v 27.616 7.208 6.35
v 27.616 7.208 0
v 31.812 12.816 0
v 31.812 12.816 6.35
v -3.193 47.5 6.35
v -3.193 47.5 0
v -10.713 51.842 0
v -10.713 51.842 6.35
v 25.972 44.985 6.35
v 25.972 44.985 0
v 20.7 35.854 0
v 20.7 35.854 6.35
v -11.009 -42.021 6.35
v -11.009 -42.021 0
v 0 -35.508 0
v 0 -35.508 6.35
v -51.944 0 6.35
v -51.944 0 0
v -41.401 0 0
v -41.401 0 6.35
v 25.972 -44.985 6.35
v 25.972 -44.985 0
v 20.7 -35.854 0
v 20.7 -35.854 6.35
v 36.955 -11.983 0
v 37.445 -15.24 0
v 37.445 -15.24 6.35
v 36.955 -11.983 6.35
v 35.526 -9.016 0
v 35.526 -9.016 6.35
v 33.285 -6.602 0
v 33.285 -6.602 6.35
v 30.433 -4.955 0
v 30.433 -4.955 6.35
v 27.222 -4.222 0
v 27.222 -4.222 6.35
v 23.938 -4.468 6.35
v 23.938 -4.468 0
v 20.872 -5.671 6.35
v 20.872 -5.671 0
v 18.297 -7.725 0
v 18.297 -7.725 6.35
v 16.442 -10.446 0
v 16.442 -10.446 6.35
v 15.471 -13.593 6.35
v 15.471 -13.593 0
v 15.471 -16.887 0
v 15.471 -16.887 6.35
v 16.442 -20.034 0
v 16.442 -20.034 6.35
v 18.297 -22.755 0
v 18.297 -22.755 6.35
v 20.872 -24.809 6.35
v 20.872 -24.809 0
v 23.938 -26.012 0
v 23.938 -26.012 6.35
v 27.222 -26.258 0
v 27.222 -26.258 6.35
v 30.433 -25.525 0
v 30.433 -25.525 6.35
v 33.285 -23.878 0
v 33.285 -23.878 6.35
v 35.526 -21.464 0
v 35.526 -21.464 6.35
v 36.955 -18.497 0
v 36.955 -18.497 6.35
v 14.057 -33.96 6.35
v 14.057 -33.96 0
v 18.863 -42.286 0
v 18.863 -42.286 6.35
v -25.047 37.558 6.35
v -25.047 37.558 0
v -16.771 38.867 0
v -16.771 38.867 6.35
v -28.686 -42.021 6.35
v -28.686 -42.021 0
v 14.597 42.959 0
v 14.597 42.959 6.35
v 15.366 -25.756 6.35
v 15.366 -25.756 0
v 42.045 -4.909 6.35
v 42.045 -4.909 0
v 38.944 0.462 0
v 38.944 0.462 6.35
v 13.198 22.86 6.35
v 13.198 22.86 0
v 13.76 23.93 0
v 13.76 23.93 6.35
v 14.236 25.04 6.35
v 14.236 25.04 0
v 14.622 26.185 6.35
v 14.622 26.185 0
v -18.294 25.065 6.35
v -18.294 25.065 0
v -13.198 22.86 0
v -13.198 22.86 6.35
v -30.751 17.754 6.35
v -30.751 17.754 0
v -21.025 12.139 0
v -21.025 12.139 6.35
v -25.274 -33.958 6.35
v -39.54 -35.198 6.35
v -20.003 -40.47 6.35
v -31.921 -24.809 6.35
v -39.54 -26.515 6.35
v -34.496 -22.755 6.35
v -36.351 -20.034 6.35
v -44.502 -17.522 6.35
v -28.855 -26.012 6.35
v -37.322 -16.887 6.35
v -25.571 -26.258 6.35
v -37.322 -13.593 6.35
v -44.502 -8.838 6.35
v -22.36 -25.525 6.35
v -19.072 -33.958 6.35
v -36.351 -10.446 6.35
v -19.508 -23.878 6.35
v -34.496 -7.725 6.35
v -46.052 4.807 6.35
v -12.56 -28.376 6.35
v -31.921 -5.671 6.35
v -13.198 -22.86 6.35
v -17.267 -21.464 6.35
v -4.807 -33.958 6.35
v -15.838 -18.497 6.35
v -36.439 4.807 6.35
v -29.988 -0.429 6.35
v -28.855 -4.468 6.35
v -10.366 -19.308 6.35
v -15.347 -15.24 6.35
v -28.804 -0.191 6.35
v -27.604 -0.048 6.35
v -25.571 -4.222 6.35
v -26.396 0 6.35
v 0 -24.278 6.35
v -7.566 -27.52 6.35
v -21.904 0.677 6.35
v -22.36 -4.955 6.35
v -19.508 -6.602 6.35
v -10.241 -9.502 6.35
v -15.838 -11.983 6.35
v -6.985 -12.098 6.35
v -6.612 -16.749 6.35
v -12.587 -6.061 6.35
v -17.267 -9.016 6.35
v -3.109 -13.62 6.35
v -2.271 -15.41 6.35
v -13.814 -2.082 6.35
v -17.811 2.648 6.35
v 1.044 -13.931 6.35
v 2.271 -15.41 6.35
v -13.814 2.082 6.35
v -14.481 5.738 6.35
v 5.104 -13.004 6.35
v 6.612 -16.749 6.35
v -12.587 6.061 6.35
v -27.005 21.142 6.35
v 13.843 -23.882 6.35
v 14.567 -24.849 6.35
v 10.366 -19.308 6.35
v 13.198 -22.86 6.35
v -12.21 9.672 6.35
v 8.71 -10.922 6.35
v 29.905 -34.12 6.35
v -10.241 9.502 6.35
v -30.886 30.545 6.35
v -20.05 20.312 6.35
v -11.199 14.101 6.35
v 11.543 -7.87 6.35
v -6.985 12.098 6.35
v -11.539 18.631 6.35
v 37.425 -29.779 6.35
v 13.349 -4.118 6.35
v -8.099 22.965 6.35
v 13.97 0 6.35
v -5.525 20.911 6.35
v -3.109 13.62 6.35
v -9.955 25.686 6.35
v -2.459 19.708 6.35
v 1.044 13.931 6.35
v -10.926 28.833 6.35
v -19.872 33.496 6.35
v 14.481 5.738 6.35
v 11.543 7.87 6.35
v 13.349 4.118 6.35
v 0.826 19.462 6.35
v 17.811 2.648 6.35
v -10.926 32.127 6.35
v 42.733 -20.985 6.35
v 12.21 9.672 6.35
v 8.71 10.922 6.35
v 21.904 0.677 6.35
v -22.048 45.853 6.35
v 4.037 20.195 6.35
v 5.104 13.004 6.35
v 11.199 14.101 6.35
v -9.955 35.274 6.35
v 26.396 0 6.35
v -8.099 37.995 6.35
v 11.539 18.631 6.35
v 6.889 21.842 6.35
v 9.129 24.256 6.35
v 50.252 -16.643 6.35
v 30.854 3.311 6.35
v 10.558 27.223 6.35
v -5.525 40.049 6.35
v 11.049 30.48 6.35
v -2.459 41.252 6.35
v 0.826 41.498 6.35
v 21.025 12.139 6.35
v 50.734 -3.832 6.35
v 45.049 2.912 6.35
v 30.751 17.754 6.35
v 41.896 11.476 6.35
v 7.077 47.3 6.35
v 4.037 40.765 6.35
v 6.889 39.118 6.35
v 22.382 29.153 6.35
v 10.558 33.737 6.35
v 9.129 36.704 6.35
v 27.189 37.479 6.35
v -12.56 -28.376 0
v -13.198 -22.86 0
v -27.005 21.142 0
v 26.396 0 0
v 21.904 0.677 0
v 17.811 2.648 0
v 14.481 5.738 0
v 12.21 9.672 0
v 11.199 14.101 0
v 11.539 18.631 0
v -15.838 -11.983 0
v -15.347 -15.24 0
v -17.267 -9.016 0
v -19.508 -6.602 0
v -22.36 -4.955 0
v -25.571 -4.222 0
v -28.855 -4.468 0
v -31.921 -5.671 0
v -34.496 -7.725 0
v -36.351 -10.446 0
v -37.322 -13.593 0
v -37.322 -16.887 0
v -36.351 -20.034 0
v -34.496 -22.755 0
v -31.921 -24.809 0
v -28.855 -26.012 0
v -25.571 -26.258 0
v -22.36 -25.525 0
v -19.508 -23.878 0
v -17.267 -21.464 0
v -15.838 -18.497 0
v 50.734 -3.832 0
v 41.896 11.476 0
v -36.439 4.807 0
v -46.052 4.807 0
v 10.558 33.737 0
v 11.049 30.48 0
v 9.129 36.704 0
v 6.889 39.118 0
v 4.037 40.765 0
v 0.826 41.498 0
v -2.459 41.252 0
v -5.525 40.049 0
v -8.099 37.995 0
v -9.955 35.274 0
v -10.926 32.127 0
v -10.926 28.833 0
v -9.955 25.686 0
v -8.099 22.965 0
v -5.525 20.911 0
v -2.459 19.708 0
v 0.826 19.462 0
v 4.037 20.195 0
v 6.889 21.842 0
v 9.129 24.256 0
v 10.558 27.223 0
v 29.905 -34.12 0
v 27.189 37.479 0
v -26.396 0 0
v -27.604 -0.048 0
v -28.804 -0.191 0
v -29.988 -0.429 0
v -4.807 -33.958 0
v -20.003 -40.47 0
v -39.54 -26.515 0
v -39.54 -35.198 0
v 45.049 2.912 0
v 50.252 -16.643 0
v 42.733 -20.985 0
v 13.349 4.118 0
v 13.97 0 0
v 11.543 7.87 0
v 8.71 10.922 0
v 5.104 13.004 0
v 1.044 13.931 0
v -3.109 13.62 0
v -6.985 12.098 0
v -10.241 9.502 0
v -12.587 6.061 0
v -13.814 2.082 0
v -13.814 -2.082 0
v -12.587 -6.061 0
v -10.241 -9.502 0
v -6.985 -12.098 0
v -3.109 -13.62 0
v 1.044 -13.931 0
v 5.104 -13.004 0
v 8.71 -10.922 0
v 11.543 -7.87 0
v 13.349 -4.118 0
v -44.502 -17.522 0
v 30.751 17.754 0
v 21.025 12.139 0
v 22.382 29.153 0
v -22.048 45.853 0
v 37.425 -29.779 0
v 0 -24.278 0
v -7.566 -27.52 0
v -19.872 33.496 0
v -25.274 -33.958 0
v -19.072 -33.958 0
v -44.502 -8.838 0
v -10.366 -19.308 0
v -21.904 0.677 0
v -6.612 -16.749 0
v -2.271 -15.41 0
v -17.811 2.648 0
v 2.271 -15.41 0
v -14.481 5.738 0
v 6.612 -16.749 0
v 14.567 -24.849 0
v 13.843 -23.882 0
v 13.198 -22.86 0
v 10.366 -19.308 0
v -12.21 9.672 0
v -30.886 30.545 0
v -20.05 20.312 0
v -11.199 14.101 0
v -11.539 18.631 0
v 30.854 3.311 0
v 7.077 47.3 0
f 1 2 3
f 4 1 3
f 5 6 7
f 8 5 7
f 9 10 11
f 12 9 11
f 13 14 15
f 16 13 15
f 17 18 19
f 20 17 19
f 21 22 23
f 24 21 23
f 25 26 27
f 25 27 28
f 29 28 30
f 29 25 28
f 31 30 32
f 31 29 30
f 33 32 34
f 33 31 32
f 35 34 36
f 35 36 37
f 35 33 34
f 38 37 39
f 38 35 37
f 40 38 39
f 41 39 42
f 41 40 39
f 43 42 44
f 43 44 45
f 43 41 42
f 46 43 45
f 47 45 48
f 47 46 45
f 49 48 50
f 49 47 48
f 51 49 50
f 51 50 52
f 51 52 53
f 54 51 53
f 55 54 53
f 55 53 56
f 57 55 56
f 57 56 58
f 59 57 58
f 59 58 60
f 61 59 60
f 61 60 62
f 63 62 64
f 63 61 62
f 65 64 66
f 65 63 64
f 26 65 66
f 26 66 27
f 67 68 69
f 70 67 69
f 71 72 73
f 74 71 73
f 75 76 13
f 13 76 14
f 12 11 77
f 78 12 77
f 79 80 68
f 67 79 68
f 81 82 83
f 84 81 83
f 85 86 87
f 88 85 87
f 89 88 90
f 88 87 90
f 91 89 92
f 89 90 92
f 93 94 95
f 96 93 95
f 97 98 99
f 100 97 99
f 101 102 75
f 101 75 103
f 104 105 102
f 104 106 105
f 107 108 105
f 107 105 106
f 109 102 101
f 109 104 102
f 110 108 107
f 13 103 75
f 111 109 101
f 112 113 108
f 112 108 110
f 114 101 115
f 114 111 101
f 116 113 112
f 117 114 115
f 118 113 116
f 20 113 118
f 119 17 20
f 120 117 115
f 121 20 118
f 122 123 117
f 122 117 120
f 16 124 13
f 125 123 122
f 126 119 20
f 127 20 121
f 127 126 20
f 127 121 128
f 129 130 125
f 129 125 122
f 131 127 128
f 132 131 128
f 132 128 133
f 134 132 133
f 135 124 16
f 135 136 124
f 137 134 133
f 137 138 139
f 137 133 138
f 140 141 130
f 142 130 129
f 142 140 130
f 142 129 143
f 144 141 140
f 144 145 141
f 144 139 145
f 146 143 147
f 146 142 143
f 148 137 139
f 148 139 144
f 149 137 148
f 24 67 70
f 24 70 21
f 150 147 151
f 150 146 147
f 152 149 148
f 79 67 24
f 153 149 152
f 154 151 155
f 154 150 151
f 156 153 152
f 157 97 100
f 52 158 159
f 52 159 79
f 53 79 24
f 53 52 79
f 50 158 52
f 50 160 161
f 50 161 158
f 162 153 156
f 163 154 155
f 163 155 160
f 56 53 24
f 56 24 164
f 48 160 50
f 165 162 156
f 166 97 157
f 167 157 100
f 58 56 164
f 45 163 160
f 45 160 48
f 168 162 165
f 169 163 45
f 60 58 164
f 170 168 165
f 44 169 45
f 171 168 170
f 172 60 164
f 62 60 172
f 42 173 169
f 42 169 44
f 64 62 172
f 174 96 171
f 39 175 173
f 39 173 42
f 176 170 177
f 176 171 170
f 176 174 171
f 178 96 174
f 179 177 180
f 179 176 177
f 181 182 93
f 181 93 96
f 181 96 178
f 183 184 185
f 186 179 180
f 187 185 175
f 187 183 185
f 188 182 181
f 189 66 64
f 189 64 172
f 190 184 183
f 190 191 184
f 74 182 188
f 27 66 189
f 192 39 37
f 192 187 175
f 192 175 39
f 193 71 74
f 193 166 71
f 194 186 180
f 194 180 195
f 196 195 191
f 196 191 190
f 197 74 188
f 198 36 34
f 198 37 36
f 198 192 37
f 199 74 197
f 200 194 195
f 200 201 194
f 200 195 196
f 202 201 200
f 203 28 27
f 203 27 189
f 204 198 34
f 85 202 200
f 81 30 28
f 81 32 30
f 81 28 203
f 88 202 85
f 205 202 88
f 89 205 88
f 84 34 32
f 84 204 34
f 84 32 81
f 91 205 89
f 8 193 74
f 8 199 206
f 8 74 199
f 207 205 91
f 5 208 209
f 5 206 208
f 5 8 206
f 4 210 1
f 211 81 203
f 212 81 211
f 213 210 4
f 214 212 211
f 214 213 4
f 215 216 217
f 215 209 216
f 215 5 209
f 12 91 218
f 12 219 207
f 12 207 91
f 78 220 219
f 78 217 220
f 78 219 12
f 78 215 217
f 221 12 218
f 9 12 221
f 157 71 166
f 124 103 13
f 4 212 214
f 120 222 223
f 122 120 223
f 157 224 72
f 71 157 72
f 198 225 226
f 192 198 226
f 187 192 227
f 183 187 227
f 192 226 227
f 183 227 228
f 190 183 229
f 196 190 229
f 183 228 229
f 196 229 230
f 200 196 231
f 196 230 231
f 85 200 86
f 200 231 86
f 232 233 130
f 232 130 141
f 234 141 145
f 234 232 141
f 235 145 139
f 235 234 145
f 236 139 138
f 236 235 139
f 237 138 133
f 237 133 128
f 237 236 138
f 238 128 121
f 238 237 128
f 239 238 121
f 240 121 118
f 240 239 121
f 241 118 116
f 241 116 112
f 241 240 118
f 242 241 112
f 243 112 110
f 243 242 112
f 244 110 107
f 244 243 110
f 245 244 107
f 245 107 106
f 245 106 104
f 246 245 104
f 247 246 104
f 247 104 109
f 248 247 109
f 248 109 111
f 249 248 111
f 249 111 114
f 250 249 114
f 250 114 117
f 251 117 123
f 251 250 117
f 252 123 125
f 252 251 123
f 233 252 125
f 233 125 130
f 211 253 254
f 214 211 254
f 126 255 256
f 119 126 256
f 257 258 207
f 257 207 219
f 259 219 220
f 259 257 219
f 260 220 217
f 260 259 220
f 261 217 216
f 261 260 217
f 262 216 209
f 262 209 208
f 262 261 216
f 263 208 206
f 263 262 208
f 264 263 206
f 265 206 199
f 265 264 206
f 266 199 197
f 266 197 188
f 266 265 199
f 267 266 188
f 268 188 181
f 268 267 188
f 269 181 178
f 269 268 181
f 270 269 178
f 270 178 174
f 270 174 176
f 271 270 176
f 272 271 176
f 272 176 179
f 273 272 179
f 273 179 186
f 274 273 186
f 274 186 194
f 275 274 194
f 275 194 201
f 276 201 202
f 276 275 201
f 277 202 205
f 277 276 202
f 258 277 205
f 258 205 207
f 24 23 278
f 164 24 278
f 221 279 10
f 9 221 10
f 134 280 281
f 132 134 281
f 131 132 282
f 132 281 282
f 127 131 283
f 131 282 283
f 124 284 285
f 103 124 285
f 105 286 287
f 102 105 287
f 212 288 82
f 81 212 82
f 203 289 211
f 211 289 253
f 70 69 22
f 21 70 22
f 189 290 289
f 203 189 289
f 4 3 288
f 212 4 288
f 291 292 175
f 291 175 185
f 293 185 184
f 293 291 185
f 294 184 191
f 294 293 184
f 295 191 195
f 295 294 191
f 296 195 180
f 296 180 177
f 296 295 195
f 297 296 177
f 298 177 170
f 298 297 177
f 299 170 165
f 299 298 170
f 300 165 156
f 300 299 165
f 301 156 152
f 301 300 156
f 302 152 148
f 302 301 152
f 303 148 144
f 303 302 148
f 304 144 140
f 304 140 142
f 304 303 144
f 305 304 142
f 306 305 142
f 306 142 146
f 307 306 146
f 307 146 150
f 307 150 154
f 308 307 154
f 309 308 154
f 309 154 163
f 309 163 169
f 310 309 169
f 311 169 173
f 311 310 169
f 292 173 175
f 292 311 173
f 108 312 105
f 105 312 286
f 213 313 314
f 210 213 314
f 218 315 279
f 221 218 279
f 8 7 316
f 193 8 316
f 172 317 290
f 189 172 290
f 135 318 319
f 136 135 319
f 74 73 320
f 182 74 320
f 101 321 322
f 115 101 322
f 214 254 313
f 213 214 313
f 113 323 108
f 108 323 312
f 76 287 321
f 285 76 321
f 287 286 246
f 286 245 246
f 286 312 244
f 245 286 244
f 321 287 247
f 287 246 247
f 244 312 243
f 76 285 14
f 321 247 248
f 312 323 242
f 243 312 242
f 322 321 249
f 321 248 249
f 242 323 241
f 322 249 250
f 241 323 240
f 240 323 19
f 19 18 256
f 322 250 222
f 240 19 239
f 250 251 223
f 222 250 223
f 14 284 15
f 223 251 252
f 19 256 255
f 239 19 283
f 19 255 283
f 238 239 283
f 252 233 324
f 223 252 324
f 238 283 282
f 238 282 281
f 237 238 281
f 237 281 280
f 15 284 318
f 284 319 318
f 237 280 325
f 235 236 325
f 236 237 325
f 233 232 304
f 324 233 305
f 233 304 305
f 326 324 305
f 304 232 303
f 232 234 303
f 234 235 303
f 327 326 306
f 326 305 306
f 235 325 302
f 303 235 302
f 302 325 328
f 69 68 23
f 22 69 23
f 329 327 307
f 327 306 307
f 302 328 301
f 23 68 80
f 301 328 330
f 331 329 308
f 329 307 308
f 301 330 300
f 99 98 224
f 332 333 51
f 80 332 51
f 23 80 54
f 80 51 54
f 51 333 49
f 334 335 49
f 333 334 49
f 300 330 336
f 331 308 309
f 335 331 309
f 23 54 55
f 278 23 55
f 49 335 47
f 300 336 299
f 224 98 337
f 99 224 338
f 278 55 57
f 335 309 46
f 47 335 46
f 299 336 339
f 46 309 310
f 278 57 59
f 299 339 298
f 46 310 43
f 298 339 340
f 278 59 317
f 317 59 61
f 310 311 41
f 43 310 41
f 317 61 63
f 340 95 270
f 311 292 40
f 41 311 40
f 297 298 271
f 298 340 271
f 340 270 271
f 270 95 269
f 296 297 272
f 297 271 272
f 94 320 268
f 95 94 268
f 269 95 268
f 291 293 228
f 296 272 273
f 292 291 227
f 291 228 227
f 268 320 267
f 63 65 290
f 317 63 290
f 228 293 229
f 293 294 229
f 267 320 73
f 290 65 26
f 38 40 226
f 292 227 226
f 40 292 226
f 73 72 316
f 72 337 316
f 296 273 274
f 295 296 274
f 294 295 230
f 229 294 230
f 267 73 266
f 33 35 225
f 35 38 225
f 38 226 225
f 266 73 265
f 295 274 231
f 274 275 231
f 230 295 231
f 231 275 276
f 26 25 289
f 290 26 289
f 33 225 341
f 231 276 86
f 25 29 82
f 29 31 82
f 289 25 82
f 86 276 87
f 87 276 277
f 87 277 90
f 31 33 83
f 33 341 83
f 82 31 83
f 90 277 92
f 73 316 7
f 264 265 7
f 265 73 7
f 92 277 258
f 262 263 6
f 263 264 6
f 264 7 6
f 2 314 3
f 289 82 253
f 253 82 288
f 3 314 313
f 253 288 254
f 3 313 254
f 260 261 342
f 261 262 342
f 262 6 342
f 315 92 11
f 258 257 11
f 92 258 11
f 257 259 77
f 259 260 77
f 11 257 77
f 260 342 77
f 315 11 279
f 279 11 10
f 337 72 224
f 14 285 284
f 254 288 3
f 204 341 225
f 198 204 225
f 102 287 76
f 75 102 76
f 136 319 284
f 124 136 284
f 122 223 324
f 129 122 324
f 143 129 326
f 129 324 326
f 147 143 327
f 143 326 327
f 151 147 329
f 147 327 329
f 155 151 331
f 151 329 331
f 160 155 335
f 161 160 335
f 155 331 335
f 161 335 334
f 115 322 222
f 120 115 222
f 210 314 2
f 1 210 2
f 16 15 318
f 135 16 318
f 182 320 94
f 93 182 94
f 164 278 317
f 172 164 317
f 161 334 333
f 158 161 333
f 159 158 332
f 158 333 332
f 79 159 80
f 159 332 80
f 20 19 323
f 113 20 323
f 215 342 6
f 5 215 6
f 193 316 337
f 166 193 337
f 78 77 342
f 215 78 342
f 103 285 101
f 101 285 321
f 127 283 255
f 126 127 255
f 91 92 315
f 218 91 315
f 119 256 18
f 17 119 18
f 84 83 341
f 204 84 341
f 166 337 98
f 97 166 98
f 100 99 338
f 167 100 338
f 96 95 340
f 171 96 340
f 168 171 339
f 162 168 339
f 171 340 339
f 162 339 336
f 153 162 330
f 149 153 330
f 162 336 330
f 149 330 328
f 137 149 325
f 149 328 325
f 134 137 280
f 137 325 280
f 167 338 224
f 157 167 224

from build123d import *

# Parameters (mm, degrees)
F0_R     = 11.049
F0_R_2   = 13.97
F1_DEPTH = 6.35


with BuildPart() as f1:
    # F0 (on Top) → F1 (new body)
    with BuildSketch(Plane.XY):
        with BuildLine():
            ThreePointArc((26.396454, 0), (13.198227, 7.62), (13.198227, 22.86))
            ThreePointArc((13.198227, 22.86), (14.009272, 24.480176), (14.622308, 26.185155))
            Line((14.622308, 26.185155), (22.382144, 29.153406))
            Line((22.382144, 29.153406), (27.188946, 37.479031))
            Line((27.188946, 37.479031), (25.972238, 44.985235))
            Line((25.972238, 44.985235), (20.700261, 35.853904))
            Line((20.700261, 35.853904), (14.596639, 42.95875))
            Line((14.596639, 42.95875), (7.07672, 47.300377))
            Line((7.07672, 47.300377), (-3.192702, 47.499965))
            Line((-3.192702, 47.499965), (-10.71262, 51.841591))
            Line((-10.71262, 51.841591), (-22.048165, 45.852972))
            Line((-22.048165, 45.852972), (-30.886479, 30.544563))
            Line((-30.886479, 30.544563), (-30.751104, 17.754158))
            Line((-30.751104, 17.754158), (-21.025084, 12.138838))
            Line((-21.025084, 12.138838), (-20.050264, 20.312221))
            Line((-20.050264, 20.312221), (-27.004857, 21.141678))
            Line((-27.004857, 21.141678), (-25.046949, 37.557762))
            Line((-25.046949, 37.557762), (-16.771019, 38.867205))
            Line((-16.771019, 38.867205), (-19.872182, 33.495833))
            Line((-19.872182, 33.495833), (-18.294169, 25.064847))
            Line((-18.294169, 25.064847), (-13.198227, 22.86))
            ThreePointArc((-13.198227, 22.86), (-13.198227, 7.62), (-26.396454, 0))
            ThreePointArc((-26.396454, 0), (-28.205091, -0.107702), (-29.988163, -0.429287))
            Line((-29.988163, -0.429287), (-36.438663, 4.806802))
            Line((-36.438663, 4.806802), (-46.052266, 4.806802))
            Line((-46.052266, 4.806802), (-51.944476, 0))
            Line((-51.944476, 0), (-41.400522, 0))
            Line((-41.400522, 0), (-44.501688, -8.838315))
            Line((-44.501688, -8.838315), (-44.501688, -17.52157))
            Line((-44.501688, -17.52157), (-39.539825, -26.514944))
            Line((-39.539825, -26.514944), (-39.539825, -35.198197))
            Line((-39.539825, -35.198197), (-28.685756, -42.020757))
            Line((-28.685756, -42.020757), (-11.009128, -42.020757))
            Line((-11.009128, -42.020757), (0, -35.508316))
            Line((0, -35.508316), (0, -24.277676))
            Line((0, -24.277676), (-7.565767, -27.520148))
            Line((-7.565767, -27.520148), (-4.806802, -33.957731))
            Line((-4.806802, -33.957731), (-20.002501, -40.470175))
            Line((-20.002501, -40.470175), (-25.274477, -33.957731))
            Line((-25.274477, -33.957731), (-19.072151, -33.957731))
            Line((-19.072151, -33.957731), (-12.559709, -28.375639))
            Line((-12.559709, -28.375639), (-13.198227, -22.86))
            ThreePointArc((-13.198227, -22.86), (0, -15.24), (13.198227, -22.86))
            ThreePointArc((13.198227, -22.86), (14.195818, -24.372474), (15.365855, -25.755868))
            Line((15.365855, -25.755868), (14.056519, -33.960209))
            Line((14.056519, -33.960209), (18.86332, -42.285833))
            Line((18.86332, -42.285833), (25.972238, -44.985235))
            Line((25.972238, -44.985235), (20.700261, -35.853904))
            Line((20.700261, -35.853904), (29.905049, -34.120435))
            Line((29.905049, -34.120435), (37.424968, -29.778808))
            Line((37.424968, -29.778808), (42.732527, -20.985021))
            Line((42.732527, -20.985021), (50.252445, -16.643395))
            Line((50.252445, -16.643395), (50.733921, -3.832215))
            Line((50.733921, -3.832215), (41.895607, 11.476194))
            Line((41.895607, 11.476194), (30.751104, 17.754158))
            Line((30.751104, 17.754158), (21.025084, 12.138838))
            Line((21.025084, 12.138838), (27.616031, 7.207928))
            Line((27.616031, 7.207928), (31.811659, 12.816053))
            Line((31.811659, 12.816053), (45.049451, 2.912414))
            Line((45.049451, 2.912414), (42.045496, -4.909474))
            Line((42.045496, -4.909474), (38.944333, 0.461898))
            Line((38.944333, 0.461898), (30.853878, 3.310792))
            Line((30.853878, 3.310792), (26.396454, 0))
        make_face()
        with Locations((-26.396454, -15.24)):
            Circle(F0_R, mode=Mode.SUBTRACT)
        Circle(F0_R_2, mode=Mode.SUBTRACT)
        with Locations((26.396454, -15.24)):
            Circle(F0_R, mode=Mode.SUBTRACT)
        with Locations((0, 30.48)):
            Circle(F0_R, mode=Mode.SUBTRACT)
    extrude(amount=F1_DEPTH)


solid = f1.part
